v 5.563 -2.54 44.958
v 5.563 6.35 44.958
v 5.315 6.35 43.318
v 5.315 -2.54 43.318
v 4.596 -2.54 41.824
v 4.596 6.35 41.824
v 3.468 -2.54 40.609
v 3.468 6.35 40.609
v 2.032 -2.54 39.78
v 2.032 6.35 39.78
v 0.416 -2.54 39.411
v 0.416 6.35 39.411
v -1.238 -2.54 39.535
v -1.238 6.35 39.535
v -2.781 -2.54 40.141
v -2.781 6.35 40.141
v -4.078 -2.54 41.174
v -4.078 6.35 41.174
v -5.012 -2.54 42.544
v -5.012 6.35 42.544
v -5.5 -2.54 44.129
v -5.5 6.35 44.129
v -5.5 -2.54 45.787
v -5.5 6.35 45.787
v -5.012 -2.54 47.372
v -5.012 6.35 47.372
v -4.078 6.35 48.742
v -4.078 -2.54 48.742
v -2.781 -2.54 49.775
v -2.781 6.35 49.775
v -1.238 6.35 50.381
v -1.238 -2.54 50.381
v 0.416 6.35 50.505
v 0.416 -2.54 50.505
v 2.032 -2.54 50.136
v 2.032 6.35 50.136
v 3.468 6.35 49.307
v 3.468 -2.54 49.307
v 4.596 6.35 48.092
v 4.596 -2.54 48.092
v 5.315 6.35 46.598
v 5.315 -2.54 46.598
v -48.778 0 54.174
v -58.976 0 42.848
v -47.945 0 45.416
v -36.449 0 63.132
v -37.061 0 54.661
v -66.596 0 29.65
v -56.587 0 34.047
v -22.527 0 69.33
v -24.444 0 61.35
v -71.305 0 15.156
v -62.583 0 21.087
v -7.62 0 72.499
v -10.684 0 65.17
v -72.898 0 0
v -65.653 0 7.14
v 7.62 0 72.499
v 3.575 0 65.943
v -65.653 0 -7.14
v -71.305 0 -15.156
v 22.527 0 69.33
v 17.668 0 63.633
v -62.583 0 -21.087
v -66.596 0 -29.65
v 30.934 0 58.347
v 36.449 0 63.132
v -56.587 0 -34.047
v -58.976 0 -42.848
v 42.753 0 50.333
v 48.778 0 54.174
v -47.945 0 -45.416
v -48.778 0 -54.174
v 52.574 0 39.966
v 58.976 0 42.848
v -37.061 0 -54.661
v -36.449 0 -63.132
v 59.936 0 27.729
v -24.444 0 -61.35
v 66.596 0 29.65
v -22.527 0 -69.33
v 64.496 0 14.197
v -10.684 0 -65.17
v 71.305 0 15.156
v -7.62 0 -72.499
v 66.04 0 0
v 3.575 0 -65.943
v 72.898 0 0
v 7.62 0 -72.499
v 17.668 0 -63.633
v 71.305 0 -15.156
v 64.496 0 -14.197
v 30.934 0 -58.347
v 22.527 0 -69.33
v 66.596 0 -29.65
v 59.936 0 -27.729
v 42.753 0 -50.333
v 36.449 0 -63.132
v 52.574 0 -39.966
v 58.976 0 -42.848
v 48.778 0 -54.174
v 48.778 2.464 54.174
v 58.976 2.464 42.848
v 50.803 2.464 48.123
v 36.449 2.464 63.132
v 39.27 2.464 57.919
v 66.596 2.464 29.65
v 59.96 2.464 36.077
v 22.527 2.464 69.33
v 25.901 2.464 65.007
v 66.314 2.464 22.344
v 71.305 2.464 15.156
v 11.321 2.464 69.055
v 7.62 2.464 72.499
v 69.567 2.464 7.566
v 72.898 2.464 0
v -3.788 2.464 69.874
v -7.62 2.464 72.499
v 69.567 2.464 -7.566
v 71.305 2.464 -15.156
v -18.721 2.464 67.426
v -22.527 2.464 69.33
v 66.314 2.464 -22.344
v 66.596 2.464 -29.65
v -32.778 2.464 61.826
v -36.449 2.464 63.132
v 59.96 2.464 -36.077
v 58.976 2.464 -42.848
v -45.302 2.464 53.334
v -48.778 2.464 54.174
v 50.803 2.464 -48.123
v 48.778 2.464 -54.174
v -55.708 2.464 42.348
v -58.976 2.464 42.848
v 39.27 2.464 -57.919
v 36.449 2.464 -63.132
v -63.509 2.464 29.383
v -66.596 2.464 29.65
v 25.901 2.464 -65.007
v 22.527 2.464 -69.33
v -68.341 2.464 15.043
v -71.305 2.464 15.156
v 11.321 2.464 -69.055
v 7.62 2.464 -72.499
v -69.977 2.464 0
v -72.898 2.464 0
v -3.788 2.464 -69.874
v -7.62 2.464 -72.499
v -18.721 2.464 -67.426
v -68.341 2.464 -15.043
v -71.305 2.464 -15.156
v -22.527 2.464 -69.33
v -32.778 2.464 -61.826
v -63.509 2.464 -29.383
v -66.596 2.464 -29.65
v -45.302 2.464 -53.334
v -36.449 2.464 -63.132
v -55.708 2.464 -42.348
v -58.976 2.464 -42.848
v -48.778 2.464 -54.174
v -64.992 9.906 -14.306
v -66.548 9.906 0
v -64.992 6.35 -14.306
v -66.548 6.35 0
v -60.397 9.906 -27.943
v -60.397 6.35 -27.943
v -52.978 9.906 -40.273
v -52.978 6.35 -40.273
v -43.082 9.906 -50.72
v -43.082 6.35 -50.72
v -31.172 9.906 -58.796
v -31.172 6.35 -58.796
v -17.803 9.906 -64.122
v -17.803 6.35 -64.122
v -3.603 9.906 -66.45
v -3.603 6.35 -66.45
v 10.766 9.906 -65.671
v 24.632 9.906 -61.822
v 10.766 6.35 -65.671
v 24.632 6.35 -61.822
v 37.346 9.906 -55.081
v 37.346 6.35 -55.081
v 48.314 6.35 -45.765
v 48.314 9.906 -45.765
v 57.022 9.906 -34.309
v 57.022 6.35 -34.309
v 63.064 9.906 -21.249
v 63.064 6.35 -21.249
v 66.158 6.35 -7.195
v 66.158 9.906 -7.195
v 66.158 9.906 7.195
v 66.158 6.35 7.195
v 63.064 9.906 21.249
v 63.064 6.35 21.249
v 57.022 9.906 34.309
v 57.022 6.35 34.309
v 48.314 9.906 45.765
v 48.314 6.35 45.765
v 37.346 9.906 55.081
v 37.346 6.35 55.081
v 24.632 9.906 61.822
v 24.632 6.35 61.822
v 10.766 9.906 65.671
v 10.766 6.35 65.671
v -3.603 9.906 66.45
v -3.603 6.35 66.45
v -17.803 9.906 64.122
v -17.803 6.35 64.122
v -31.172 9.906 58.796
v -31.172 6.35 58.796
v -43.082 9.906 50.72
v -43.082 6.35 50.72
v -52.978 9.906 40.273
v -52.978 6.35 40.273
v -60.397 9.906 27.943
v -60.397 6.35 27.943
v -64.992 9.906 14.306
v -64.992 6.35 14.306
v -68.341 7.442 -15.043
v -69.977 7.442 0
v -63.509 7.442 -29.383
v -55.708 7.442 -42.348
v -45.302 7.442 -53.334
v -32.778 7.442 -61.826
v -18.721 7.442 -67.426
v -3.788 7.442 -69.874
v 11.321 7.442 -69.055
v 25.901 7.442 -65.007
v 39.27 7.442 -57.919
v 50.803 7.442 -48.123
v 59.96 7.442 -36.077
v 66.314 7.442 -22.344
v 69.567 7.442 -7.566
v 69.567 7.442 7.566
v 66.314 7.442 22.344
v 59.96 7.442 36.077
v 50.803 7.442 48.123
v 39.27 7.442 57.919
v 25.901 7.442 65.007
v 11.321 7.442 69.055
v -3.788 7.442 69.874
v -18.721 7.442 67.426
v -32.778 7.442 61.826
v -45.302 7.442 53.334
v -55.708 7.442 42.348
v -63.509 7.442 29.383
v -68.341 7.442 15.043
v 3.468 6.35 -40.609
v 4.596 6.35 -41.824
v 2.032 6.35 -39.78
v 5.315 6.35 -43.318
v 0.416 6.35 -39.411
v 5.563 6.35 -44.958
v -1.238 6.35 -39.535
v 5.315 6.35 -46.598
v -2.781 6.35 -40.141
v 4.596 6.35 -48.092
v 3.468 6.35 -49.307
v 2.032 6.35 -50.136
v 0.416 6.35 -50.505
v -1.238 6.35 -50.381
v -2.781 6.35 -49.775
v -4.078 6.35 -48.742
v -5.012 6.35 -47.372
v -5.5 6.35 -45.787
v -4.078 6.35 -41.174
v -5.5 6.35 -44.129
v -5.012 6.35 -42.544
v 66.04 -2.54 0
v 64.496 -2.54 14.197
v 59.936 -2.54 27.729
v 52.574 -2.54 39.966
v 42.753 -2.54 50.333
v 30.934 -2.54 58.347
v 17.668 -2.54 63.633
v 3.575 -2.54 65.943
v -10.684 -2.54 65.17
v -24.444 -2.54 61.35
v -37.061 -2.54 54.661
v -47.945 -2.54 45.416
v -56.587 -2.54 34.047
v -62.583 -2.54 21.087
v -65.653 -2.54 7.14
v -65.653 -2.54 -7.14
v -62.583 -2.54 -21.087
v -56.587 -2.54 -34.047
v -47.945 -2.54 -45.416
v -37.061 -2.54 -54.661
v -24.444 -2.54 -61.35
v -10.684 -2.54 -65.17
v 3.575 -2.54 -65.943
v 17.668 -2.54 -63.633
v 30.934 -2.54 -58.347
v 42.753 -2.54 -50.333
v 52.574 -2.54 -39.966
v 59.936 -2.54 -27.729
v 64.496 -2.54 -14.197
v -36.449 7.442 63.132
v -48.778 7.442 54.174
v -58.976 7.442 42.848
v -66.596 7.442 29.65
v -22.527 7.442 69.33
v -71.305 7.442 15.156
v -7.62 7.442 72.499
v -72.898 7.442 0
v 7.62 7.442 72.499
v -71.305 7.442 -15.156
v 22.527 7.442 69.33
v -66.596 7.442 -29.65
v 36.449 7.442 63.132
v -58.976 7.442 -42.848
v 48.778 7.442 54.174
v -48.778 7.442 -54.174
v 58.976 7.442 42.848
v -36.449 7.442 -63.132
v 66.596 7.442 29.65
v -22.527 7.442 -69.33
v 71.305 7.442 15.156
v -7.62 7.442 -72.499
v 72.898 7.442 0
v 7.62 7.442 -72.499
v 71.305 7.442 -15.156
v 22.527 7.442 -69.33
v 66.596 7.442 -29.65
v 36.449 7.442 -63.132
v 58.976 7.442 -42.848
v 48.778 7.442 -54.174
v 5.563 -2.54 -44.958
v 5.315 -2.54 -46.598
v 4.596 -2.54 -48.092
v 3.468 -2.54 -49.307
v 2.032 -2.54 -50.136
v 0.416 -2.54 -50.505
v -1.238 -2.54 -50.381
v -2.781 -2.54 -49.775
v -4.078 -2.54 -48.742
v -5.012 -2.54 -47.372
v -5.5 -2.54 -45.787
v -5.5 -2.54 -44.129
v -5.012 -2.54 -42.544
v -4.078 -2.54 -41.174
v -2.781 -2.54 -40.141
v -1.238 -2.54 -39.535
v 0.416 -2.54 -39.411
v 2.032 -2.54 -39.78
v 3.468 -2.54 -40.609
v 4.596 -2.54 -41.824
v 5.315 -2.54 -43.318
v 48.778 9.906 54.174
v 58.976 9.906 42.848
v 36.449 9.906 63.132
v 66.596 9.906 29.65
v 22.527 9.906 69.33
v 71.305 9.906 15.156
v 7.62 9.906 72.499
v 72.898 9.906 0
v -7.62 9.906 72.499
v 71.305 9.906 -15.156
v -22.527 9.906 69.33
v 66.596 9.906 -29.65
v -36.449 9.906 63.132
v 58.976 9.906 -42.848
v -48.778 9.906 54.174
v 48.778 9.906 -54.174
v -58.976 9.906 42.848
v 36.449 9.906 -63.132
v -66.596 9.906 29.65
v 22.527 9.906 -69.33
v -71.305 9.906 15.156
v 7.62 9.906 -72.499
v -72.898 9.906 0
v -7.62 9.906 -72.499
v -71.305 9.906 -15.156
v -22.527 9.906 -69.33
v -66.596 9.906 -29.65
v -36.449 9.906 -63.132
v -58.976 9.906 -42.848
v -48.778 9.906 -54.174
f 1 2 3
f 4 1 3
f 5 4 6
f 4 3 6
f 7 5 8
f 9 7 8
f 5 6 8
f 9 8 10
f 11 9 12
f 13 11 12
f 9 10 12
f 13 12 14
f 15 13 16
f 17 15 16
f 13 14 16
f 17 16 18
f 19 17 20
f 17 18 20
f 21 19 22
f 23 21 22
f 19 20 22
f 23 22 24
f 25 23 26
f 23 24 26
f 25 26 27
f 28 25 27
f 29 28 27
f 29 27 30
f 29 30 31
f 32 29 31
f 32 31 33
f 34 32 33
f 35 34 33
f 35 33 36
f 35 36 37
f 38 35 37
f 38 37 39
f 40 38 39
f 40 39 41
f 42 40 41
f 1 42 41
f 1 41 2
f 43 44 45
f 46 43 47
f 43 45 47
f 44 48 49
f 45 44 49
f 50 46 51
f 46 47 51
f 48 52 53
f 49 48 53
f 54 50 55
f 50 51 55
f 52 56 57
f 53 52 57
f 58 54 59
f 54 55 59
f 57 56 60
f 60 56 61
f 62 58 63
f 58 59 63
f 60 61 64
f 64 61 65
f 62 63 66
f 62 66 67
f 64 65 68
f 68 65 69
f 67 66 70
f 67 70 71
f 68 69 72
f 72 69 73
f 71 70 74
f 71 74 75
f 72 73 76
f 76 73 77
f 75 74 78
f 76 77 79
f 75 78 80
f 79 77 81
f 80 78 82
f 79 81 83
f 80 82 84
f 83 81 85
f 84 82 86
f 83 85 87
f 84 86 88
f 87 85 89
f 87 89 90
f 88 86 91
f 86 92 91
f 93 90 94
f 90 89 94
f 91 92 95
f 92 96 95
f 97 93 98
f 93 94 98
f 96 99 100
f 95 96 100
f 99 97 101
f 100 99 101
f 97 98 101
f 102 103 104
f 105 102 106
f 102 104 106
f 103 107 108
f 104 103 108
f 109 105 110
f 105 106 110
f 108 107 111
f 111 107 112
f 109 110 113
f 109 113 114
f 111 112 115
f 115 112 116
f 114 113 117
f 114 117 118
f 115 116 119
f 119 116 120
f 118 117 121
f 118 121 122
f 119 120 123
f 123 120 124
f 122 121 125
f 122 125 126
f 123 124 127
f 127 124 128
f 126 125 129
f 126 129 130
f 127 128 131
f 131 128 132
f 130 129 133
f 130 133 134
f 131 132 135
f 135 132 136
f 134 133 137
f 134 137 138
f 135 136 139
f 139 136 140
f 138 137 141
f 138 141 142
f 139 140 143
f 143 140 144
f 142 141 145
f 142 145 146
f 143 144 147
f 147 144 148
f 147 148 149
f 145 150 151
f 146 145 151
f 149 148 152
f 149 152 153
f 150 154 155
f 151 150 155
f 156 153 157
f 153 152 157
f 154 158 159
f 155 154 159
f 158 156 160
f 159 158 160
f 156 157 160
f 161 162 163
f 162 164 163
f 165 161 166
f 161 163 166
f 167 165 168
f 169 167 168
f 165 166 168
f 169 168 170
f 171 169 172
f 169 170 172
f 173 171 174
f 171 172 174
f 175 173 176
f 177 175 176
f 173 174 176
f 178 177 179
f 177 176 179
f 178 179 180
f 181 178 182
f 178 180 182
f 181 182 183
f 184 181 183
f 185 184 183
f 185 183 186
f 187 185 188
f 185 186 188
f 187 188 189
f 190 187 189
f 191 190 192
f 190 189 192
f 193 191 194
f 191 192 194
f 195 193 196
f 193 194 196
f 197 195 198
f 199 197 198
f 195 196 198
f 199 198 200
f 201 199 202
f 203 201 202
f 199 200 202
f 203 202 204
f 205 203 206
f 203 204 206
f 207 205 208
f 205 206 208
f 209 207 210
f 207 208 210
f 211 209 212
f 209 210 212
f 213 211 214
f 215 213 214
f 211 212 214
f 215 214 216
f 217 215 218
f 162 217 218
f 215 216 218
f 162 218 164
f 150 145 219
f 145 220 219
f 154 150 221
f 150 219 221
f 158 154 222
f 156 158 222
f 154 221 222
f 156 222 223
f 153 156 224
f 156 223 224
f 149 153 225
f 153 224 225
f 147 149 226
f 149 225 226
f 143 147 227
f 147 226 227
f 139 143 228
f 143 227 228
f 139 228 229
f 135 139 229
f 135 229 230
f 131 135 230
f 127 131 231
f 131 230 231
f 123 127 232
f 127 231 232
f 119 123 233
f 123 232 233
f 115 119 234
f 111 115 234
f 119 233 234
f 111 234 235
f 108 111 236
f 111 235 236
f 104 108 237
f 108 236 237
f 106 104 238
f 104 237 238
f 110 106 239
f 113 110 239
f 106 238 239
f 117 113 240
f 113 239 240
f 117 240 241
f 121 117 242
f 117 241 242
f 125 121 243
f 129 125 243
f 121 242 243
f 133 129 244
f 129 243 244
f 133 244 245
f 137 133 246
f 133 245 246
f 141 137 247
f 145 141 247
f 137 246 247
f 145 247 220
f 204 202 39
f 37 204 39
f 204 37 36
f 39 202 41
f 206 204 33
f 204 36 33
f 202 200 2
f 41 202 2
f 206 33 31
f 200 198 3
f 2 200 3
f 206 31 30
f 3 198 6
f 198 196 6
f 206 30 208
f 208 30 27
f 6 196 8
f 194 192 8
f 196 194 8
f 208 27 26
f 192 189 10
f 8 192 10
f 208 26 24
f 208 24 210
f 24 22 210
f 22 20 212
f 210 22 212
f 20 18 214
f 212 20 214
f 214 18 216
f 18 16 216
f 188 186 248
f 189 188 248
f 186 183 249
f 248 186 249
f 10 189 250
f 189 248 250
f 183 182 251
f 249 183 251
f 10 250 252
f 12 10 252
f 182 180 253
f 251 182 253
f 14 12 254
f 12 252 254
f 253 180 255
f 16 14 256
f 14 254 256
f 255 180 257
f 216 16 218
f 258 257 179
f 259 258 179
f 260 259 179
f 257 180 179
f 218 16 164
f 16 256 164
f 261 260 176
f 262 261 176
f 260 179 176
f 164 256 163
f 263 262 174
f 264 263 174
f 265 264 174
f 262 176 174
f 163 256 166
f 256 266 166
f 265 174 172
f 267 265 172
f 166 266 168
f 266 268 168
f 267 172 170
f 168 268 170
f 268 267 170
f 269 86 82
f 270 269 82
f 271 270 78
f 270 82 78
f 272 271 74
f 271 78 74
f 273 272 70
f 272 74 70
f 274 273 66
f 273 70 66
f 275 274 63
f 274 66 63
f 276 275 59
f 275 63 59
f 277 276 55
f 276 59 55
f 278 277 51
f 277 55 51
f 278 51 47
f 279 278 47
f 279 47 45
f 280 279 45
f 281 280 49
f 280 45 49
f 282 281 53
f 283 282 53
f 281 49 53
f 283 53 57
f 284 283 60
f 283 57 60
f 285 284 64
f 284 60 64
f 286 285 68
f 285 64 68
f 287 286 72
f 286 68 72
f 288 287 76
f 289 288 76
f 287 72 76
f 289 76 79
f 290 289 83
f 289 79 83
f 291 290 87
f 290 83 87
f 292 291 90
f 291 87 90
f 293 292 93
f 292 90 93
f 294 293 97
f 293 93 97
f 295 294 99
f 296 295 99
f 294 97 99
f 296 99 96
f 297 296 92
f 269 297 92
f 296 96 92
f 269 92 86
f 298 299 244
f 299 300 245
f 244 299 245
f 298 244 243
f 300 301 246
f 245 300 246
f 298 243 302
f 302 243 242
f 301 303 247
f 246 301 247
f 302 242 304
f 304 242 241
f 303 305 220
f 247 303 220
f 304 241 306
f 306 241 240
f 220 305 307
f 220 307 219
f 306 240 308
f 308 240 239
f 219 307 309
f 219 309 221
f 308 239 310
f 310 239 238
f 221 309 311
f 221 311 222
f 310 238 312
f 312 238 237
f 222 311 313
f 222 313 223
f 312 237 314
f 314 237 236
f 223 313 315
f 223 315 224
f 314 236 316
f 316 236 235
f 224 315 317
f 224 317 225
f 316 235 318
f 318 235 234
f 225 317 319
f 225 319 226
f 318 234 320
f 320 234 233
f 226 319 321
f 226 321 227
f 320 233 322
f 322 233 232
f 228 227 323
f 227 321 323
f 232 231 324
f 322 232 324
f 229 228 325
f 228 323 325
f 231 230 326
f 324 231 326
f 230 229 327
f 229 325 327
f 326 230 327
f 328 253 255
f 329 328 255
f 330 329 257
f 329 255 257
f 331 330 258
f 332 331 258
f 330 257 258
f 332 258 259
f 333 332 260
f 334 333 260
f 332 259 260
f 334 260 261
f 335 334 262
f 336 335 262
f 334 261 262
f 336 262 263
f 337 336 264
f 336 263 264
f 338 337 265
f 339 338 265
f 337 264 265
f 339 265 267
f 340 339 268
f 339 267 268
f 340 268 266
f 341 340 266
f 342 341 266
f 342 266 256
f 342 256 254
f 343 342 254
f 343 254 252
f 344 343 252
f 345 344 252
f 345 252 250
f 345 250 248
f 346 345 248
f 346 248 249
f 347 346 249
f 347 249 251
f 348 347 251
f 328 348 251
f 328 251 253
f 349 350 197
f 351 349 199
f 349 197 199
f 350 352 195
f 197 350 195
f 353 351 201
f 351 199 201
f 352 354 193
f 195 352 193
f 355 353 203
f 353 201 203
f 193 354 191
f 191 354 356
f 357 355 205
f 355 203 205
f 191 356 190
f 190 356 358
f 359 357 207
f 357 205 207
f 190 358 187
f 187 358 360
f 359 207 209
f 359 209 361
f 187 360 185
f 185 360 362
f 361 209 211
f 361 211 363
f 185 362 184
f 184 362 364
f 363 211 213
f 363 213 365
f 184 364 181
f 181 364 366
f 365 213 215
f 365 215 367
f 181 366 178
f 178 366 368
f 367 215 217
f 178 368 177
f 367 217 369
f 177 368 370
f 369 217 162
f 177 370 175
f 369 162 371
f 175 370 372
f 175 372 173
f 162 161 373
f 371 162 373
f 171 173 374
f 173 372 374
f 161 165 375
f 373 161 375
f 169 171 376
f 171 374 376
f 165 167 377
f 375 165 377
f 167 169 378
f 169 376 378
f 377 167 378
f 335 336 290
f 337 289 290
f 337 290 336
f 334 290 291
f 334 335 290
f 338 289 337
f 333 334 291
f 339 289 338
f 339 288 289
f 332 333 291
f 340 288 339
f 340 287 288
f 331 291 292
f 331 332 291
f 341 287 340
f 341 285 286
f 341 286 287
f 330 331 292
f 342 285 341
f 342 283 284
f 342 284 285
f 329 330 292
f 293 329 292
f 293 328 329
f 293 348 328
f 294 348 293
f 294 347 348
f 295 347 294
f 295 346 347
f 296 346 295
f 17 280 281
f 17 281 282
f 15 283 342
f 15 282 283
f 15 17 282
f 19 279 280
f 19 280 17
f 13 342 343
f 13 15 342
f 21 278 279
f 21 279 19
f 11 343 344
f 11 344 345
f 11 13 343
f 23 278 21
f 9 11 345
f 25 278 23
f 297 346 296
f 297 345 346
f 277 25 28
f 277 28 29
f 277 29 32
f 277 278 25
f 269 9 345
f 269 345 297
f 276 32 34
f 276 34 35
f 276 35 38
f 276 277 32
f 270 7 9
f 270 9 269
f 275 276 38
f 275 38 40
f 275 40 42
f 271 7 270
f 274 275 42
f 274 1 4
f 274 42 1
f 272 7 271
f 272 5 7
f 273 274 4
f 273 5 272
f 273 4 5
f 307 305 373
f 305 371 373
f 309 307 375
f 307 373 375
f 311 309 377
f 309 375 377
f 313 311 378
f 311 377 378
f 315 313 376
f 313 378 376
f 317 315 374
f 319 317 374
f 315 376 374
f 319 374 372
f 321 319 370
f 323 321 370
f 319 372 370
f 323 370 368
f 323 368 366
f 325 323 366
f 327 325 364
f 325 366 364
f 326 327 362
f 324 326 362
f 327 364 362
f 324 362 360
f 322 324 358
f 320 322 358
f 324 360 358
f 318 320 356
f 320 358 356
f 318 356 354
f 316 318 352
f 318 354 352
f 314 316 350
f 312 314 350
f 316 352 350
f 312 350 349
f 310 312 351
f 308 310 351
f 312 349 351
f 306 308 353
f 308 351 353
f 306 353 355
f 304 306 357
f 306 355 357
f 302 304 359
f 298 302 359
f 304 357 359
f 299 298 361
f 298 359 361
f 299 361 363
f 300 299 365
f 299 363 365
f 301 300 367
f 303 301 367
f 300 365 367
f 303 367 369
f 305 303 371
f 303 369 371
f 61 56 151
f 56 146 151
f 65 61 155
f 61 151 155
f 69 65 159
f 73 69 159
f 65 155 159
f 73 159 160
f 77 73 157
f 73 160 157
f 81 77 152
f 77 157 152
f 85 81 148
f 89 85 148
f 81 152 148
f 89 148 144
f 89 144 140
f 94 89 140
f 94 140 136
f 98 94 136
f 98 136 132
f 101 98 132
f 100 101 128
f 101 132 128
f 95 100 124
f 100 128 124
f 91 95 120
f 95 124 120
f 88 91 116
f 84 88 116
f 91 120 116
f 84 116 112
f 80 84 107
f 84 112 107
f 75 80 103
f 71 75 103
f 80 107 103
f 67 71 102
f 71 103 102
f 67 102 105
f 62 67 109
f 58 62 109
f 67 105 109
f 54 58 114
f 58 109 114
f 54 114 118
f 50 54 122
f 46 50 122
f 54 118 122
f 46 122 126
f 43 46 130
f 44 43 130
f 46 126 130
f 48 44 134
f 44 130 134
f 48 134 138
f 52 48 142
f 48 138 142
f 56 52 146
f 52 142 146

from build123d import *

# Parameters (mm, degrees)
SKETCH6_R                                = 66.04
BOSS_EXTRUDE1_DEPTH                      = 2.54
PIPE_TAP_DRILL_FOR_1_4_TAP_RELIEF_VALV_D = 11.1252
PIPE_TAP_DRILL_FOR_1_4_TAP_VENT_VALVE_D  = 11.1252


with BuildPart() as part:
    # Sketch1 → Revolve1 (revolve)
    with BuildSketch(Plane.XY, mode=Mode.PRIVATE) as revolve1_sk:
        Polygon((0, 0), (72.898, 0), (72.898, 2.4638), (69.977, 2.4638), (69.977, 7.4422), (72.898, 7.4422), (72.898, 9.906), (66.548, 9.906), (66.548, 6.35), (0, 6.35), align=None)
    revolve(revolve1_sk.sketch.rotate(Axis((0, 48.192213231, 0), (0, -1, 0)), 180), axis=Axis((0, 48.192213231, 0), (0, -1, 0)))

    # Sketch6 → Boss-Extrude1 (add)
    with BuildSketch(Plane.XZ):
        Circle(SKETCH6_R)
    extrude(amount=BOSS_EXTRUDE1_DEPTH)

    # Pipe Tap Drill for 1/4 Tap - Relief Valve (through all)
    with Locations(Plane(origin=(0, -2.54, 0), x_dir=(-1, 0, 0), z_dir=(0, -1, 0))):
        with Locations((0, 44.958)):
            Hole(PIPE_TAP_DRILL_FOR_1_4_TAP_RELIEF_VALV_D / 2)

    # Pipe Tap Drill for 1/4 Tap - Vent Valve (through all)
    with Locations(Plane(origin=(0, -2.54, 0), x_dir=(-1, 0, 0), z_dir=(0, -1, 0))):
        with Locations((0, -44.958)):
            Hole(PIPE_TAP_DRILL_FOR_1_4_TAP_VENT_VALVE_D / 2)


solid = part.part
